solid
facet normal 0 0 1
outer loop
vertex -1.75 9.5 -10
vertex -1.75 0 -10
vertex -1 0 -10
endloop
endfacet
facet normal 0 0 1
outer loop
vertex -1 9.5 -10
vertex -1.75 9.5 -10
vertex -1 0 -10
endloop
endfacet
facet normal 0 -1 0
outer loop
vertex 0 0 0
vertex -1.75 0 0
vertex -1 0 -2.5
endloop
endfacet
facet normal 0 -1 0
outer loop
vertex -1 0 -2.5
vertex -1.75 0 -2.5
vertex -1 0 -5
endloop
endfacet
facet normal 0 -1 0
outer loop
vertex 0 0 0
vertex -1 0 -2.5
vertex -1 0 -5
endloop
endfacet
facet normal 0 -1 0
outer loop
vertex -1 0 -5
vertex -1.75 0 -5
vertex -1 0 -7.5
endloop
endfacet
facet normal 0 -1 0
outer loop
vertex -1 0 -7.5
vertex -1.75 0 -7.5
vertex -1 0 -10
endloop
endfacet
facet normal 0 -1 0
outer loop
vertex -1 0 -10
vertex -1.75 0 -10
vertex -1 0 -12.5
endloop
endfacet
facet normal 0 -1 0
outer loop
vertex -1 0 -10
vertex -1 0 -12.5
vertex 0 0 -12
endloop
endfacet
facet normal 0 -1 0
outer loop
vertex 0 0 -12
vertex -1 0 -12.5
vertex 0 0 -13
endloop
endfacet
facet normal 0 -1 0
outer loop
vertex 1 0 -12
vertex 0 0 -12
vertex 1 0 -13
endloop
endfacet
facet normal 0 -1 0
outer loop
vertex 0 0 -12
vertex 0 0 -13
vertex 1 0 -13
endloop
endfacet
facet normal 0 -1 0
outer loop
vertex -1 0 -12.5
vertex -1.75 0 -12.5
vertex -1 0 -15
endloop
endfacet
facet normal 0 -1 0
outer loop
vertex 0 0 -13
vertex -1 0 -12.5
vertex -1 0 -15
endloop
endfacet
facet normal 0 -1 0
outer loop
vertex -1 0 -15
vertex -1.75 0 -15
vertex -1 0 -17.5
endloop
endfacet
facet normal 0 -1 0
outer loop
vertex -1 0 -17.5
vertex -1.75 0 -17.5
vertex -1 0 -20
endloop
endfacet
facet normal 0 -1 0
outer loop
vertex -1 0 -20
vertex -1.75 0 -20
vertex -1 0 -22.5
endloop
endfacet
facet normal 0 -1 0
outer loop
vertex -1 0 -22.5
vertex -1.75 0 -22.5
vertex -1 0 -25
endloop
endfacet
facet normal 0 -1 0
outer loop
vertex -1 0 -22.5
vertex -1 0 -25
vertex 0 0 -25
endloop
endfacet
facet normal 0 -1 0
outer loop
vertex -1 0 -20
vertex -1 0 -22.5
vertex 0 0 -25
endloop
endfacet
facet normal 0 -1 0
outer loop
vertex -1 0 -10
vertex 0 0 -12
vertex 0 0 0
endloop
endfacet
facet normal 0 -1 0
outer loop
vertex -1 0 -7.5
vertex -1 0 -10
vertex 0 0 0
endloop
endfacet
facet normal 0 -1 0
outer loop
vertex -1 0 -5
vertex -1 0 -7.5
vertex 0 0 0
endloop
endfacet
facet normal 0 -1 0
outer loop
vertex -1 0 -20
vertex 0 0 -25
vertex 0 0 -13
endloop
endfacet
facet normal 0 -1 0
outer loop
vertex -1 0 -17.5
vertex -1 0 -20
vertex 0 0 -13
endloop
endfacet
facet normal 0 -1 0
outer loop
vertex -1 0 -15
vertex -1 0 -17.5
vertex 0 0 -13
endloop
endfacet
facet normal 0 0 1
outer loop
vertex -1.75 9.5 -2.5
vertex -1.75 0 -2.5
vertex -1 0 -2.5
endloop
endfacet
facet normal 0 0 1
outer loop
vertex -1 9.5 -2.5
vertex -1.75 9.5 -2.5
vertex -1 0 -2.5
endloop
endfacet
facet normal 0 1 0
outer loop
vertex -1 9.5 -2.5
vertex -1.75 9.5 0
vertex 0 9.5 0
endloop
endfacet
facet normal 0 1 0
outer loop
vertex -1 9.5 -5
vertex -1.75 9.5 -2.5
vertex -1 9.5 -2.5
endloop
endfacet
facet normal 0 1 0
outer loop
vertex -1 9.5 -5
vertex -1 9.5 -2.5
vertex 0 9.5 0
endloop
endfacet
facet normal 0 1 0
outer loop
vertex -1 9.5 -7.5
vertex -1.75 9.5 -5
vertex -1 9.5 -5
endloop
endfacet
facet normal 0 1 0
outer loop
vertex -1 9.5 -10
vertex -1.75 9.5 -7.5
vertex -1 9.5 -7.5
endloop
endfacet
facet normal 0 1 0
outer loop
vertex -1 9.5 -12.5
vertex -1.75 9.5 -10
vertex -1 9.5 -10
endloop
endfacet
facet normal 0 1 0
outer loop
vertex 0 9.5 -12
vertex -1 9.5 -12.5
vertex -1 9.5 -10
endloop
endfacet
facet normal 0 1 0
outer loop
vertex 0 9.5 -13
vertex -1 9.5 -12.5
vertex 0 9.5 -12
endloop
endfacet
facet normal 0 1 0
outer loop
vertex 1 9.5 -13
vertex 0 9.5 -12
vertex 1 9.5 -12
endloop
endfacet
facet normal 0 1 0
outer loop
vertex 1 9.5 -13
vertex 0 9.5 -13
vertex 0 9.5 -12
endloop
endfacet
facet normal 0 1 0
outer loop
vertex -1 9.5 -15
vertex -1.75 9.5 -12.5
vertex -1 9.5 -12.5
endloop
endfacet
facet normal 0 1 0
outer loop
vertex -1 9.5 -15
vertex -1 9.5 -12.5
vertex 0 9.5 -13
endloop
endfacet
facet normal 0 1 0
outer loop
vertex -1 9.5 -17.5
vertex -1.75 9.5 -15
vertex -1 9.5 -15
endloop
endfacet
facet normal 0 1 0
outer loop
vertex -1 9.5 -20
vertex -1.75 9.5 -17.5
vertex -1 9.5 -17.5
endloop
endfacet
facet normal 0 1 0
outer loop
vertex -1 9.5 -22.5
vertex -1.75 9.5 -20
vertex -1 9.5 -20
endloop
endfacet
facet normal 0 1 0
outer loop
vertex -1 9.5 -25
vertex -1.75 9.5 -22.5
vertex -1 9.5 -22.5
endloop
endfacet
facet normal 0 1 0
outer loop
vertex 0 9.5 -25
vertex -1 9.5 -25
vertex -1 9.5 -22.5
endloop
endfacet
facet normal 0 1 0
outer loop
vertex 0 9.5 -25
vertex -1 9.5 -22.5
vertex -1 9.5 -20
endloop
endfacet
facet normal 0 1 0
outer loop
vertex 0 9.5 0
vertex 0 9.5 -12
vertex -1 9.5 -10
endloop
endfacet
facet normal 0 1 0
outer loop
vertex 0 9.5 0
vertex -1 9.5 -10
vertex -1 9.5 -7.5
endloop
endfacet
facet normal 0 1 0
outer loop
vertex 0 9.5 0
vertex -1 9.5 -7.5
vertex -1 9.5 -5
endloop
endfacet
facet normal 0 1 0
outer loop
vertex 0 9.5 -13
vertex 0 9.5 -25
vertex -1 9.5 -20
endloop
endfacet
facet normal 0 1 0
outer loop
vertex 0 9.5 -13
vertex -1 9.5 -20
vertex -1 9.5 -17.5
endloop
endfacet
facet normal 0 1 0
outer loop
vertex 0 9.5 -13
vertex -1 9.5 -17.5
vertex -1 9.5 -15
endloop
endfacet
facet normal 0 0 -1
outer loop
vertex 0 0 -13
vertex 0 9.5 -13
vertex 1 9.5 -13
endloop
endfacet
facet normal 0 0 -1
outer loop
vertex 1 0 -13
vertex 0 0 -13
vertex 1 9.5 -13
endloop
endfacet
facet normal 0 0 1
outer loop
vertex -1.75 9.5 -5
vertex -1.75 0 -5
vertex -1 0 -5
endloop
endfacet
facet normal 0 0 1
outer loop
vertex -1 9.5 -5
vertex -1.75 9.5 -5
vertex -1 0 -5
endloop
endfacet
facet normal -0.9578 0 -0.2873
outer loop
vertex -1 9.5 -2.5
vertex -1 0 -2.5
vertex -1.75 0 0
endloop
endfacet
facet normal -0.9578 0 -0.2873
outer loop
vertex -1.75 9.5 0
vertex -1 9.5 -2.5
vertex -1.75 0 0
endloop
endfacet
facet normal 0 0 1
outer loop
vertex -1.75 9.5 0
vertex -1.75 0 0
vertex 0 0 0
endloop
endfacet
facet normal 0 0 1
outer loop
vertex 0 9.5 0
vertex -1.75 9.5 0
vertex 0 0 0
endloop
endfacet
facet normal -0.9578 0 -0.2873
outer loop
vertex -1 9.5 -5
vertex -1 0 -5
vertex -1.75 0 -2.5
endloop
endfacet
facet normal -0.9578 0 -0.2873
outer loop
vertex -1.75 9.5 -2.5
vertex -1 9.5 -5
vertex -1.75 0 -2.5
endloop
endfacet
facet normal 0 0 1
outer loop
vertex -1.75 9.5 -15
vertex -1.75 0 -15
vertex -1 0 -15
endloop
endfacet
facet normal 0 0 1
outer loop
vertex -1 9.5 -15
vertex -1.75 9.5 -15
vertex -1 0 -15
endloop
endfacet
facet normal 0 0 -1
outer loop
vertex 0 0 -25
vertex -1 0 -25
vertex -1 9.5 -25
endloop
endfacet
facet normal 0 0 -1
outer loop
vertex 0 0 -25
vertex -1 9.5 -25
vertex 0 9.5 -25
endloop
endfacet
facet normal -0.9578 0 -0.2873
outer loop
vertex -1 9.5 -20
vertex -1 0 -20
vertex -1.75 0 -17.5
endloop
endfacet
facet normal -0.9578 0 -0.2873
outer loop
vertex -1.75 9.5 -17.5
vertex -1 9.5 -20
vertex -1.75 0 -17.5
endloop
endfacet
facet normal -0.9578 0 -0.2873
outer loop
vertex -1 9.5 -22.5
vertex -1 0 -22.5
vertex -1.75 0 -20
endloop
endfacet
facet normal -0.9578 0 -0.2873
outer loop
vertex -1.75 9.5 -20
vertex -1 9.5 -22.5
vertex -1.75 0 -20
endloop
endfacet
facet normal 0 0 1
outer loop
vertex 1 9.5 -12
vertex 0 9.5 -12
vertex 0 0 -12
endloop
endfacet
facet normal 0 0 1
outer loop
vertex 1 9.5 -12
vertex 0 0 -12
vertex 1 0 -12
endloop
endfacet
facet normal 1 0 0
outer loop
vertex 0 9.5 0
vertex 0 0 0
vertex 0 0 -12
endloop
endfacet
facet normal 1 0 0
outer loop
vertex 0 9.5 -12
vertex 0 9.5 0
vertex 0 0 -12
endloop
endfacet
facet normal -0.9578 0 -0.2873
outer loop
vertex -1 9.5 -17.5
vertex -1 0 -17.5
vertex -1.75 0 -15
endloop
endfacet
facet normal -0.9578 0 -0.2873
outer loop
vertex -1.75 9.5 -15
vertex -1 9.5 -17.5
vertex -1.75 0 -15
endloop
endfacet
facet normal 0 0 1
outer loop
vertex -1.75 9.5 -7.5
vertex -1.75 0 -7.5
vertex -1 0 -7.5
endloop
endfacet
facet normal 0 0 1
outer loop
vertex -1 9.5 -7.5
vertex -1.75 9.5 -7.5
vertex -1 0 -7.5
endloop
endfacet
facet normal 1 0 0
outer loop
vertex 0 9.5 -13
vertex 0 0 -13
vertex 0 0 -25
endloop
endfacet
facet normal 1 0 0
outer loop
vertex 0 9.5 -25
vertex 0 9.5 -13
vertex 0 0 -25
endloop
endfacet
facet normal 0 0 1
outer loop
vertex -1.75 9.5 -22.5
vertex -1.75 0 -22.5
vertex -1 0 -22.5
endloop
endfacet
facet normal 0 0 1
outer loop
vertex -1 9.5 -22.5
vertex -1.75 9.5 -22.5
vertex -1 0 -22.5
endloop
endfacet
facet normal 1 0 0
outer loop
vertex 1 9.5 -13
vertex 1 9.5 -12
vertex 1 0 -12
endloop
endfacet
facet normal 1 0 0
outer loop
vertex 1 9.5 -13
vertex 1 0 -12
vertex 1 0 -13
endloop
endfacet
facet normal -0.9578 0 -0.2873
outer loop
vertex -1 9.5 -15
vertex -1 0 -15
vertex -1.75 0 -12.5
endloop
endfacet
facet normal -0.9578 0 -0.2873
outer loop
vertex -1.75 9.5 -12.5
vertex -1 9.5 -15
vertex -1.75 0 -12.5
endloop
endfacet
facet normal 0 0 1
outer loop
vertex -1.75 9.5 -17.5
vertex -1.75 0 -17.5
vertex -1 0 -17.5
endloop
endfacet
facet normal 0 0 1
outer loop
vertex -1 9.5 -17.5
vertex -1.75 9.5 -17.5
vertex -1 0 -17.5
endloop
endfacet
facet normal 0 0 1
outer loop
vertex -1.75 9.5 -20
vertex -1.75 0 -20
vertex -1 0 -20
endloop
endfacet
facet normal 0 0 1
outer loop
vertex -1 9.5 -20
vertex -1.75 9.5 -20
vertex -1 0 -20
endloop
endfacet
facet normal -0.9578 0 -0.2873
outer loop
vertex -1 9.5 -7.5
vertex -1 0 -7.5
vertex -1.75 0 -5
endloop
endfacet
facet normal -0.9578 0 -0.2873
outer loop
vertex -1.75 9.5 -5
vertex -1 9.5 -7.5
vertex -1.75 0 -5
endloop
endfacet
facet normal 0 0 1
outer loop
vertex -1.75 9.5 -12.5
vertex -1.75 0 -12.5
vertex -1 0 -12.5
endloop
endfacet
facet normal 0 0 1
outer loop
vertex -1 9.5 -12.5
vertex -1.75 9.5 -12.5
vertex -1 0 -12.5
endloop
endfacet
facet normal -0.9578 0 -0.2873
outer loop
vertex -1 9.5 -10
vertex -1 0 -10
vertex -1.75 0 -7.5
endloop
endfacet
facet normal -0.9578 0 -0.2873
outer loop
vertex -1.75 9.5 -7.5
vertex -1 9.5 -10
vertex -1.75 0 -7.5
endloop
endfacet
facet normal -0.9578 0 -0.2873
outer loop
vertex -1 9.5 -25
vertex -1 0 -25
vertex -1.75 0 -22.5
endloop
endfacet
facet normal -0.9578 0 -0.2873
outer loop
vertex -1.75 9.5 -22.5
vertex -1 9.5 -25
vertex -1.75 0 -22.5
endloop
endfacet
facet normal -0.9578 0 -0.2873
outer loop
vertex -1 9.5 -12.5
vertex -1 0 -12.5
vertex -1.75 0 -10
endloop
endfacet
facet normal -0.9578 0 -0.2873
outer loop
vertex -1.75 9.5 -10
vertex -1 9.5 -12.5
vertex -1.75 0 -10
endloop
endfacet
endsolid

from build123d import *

# Parameters (mm, degrees)
SKETCH1_W           = 1
SKETCH1_H           = 25
BOSS_EXTRUDE1_DEPTH = 9.5
SKETCH2_W           = 1
SKETCH2_H           = 1
BOSS_EXTRUDE2_DEPTH = 9.5


with BuildPart() as part:
    # Sketch1 → Boss-Extrude1 (new body)
    with BuildSketch(Plane(origin=(0, 0, 0), x_dir=(1, 0, 0), z_dir=(0, 1, 0))):
        with Locations((-0.5, 12.5)):
            Rectangle(SKETCH1_W, SKETCH1_H)
        Polygon((-1, 22.5), (-1, 25), (-1.75, 22.5), align=None)
        Polygon((-1, 20), (-1, 22.5), (-1.75, 20), align=None)
        Polygon((-1, 17.5), (-1, 20), (-1.75, 17.5), align=None)
        Polygon((-1, 15), (-1, 17.5), (-1.75, 15), align=None)
        Polygon((-1, 12.5), (-1, 15), (-1.75, 12.5), align=None)
        Polygon((-1.75, 10), (-1, 10), (-1, 12.5), align=None)
        Polygon((-1.75, 7.5), (-1, 7.5), (-1, 10), align=None)
        Polygon((-1.75, 5), (-1, 5), (-1, 7.5), align=None)
        Polygon((-1.75, 0), (-1, 0), (-1, 2.5), align=None)
        Polygon((-1.75, 2.5), (-1, 2.5), (-1, 5), align=None)
    extrude(amount=BOSS_EXTRUDE1_DEPTH)

    # Sketch2 → Boss-Extrude2 (add)
    with BuildSketch(Plane(origin=(0, 9.5, 0), x_dir=(1, 0, 0), z_dir=(0, 1, 0))):
        with Locations((0.5, 12.5)):
            Rectangle(SKETCH2_W, SKETCH2_H)
    extrude(amount=-BOSS_EXTRUDE2_DEPTH)


solid = part.part
